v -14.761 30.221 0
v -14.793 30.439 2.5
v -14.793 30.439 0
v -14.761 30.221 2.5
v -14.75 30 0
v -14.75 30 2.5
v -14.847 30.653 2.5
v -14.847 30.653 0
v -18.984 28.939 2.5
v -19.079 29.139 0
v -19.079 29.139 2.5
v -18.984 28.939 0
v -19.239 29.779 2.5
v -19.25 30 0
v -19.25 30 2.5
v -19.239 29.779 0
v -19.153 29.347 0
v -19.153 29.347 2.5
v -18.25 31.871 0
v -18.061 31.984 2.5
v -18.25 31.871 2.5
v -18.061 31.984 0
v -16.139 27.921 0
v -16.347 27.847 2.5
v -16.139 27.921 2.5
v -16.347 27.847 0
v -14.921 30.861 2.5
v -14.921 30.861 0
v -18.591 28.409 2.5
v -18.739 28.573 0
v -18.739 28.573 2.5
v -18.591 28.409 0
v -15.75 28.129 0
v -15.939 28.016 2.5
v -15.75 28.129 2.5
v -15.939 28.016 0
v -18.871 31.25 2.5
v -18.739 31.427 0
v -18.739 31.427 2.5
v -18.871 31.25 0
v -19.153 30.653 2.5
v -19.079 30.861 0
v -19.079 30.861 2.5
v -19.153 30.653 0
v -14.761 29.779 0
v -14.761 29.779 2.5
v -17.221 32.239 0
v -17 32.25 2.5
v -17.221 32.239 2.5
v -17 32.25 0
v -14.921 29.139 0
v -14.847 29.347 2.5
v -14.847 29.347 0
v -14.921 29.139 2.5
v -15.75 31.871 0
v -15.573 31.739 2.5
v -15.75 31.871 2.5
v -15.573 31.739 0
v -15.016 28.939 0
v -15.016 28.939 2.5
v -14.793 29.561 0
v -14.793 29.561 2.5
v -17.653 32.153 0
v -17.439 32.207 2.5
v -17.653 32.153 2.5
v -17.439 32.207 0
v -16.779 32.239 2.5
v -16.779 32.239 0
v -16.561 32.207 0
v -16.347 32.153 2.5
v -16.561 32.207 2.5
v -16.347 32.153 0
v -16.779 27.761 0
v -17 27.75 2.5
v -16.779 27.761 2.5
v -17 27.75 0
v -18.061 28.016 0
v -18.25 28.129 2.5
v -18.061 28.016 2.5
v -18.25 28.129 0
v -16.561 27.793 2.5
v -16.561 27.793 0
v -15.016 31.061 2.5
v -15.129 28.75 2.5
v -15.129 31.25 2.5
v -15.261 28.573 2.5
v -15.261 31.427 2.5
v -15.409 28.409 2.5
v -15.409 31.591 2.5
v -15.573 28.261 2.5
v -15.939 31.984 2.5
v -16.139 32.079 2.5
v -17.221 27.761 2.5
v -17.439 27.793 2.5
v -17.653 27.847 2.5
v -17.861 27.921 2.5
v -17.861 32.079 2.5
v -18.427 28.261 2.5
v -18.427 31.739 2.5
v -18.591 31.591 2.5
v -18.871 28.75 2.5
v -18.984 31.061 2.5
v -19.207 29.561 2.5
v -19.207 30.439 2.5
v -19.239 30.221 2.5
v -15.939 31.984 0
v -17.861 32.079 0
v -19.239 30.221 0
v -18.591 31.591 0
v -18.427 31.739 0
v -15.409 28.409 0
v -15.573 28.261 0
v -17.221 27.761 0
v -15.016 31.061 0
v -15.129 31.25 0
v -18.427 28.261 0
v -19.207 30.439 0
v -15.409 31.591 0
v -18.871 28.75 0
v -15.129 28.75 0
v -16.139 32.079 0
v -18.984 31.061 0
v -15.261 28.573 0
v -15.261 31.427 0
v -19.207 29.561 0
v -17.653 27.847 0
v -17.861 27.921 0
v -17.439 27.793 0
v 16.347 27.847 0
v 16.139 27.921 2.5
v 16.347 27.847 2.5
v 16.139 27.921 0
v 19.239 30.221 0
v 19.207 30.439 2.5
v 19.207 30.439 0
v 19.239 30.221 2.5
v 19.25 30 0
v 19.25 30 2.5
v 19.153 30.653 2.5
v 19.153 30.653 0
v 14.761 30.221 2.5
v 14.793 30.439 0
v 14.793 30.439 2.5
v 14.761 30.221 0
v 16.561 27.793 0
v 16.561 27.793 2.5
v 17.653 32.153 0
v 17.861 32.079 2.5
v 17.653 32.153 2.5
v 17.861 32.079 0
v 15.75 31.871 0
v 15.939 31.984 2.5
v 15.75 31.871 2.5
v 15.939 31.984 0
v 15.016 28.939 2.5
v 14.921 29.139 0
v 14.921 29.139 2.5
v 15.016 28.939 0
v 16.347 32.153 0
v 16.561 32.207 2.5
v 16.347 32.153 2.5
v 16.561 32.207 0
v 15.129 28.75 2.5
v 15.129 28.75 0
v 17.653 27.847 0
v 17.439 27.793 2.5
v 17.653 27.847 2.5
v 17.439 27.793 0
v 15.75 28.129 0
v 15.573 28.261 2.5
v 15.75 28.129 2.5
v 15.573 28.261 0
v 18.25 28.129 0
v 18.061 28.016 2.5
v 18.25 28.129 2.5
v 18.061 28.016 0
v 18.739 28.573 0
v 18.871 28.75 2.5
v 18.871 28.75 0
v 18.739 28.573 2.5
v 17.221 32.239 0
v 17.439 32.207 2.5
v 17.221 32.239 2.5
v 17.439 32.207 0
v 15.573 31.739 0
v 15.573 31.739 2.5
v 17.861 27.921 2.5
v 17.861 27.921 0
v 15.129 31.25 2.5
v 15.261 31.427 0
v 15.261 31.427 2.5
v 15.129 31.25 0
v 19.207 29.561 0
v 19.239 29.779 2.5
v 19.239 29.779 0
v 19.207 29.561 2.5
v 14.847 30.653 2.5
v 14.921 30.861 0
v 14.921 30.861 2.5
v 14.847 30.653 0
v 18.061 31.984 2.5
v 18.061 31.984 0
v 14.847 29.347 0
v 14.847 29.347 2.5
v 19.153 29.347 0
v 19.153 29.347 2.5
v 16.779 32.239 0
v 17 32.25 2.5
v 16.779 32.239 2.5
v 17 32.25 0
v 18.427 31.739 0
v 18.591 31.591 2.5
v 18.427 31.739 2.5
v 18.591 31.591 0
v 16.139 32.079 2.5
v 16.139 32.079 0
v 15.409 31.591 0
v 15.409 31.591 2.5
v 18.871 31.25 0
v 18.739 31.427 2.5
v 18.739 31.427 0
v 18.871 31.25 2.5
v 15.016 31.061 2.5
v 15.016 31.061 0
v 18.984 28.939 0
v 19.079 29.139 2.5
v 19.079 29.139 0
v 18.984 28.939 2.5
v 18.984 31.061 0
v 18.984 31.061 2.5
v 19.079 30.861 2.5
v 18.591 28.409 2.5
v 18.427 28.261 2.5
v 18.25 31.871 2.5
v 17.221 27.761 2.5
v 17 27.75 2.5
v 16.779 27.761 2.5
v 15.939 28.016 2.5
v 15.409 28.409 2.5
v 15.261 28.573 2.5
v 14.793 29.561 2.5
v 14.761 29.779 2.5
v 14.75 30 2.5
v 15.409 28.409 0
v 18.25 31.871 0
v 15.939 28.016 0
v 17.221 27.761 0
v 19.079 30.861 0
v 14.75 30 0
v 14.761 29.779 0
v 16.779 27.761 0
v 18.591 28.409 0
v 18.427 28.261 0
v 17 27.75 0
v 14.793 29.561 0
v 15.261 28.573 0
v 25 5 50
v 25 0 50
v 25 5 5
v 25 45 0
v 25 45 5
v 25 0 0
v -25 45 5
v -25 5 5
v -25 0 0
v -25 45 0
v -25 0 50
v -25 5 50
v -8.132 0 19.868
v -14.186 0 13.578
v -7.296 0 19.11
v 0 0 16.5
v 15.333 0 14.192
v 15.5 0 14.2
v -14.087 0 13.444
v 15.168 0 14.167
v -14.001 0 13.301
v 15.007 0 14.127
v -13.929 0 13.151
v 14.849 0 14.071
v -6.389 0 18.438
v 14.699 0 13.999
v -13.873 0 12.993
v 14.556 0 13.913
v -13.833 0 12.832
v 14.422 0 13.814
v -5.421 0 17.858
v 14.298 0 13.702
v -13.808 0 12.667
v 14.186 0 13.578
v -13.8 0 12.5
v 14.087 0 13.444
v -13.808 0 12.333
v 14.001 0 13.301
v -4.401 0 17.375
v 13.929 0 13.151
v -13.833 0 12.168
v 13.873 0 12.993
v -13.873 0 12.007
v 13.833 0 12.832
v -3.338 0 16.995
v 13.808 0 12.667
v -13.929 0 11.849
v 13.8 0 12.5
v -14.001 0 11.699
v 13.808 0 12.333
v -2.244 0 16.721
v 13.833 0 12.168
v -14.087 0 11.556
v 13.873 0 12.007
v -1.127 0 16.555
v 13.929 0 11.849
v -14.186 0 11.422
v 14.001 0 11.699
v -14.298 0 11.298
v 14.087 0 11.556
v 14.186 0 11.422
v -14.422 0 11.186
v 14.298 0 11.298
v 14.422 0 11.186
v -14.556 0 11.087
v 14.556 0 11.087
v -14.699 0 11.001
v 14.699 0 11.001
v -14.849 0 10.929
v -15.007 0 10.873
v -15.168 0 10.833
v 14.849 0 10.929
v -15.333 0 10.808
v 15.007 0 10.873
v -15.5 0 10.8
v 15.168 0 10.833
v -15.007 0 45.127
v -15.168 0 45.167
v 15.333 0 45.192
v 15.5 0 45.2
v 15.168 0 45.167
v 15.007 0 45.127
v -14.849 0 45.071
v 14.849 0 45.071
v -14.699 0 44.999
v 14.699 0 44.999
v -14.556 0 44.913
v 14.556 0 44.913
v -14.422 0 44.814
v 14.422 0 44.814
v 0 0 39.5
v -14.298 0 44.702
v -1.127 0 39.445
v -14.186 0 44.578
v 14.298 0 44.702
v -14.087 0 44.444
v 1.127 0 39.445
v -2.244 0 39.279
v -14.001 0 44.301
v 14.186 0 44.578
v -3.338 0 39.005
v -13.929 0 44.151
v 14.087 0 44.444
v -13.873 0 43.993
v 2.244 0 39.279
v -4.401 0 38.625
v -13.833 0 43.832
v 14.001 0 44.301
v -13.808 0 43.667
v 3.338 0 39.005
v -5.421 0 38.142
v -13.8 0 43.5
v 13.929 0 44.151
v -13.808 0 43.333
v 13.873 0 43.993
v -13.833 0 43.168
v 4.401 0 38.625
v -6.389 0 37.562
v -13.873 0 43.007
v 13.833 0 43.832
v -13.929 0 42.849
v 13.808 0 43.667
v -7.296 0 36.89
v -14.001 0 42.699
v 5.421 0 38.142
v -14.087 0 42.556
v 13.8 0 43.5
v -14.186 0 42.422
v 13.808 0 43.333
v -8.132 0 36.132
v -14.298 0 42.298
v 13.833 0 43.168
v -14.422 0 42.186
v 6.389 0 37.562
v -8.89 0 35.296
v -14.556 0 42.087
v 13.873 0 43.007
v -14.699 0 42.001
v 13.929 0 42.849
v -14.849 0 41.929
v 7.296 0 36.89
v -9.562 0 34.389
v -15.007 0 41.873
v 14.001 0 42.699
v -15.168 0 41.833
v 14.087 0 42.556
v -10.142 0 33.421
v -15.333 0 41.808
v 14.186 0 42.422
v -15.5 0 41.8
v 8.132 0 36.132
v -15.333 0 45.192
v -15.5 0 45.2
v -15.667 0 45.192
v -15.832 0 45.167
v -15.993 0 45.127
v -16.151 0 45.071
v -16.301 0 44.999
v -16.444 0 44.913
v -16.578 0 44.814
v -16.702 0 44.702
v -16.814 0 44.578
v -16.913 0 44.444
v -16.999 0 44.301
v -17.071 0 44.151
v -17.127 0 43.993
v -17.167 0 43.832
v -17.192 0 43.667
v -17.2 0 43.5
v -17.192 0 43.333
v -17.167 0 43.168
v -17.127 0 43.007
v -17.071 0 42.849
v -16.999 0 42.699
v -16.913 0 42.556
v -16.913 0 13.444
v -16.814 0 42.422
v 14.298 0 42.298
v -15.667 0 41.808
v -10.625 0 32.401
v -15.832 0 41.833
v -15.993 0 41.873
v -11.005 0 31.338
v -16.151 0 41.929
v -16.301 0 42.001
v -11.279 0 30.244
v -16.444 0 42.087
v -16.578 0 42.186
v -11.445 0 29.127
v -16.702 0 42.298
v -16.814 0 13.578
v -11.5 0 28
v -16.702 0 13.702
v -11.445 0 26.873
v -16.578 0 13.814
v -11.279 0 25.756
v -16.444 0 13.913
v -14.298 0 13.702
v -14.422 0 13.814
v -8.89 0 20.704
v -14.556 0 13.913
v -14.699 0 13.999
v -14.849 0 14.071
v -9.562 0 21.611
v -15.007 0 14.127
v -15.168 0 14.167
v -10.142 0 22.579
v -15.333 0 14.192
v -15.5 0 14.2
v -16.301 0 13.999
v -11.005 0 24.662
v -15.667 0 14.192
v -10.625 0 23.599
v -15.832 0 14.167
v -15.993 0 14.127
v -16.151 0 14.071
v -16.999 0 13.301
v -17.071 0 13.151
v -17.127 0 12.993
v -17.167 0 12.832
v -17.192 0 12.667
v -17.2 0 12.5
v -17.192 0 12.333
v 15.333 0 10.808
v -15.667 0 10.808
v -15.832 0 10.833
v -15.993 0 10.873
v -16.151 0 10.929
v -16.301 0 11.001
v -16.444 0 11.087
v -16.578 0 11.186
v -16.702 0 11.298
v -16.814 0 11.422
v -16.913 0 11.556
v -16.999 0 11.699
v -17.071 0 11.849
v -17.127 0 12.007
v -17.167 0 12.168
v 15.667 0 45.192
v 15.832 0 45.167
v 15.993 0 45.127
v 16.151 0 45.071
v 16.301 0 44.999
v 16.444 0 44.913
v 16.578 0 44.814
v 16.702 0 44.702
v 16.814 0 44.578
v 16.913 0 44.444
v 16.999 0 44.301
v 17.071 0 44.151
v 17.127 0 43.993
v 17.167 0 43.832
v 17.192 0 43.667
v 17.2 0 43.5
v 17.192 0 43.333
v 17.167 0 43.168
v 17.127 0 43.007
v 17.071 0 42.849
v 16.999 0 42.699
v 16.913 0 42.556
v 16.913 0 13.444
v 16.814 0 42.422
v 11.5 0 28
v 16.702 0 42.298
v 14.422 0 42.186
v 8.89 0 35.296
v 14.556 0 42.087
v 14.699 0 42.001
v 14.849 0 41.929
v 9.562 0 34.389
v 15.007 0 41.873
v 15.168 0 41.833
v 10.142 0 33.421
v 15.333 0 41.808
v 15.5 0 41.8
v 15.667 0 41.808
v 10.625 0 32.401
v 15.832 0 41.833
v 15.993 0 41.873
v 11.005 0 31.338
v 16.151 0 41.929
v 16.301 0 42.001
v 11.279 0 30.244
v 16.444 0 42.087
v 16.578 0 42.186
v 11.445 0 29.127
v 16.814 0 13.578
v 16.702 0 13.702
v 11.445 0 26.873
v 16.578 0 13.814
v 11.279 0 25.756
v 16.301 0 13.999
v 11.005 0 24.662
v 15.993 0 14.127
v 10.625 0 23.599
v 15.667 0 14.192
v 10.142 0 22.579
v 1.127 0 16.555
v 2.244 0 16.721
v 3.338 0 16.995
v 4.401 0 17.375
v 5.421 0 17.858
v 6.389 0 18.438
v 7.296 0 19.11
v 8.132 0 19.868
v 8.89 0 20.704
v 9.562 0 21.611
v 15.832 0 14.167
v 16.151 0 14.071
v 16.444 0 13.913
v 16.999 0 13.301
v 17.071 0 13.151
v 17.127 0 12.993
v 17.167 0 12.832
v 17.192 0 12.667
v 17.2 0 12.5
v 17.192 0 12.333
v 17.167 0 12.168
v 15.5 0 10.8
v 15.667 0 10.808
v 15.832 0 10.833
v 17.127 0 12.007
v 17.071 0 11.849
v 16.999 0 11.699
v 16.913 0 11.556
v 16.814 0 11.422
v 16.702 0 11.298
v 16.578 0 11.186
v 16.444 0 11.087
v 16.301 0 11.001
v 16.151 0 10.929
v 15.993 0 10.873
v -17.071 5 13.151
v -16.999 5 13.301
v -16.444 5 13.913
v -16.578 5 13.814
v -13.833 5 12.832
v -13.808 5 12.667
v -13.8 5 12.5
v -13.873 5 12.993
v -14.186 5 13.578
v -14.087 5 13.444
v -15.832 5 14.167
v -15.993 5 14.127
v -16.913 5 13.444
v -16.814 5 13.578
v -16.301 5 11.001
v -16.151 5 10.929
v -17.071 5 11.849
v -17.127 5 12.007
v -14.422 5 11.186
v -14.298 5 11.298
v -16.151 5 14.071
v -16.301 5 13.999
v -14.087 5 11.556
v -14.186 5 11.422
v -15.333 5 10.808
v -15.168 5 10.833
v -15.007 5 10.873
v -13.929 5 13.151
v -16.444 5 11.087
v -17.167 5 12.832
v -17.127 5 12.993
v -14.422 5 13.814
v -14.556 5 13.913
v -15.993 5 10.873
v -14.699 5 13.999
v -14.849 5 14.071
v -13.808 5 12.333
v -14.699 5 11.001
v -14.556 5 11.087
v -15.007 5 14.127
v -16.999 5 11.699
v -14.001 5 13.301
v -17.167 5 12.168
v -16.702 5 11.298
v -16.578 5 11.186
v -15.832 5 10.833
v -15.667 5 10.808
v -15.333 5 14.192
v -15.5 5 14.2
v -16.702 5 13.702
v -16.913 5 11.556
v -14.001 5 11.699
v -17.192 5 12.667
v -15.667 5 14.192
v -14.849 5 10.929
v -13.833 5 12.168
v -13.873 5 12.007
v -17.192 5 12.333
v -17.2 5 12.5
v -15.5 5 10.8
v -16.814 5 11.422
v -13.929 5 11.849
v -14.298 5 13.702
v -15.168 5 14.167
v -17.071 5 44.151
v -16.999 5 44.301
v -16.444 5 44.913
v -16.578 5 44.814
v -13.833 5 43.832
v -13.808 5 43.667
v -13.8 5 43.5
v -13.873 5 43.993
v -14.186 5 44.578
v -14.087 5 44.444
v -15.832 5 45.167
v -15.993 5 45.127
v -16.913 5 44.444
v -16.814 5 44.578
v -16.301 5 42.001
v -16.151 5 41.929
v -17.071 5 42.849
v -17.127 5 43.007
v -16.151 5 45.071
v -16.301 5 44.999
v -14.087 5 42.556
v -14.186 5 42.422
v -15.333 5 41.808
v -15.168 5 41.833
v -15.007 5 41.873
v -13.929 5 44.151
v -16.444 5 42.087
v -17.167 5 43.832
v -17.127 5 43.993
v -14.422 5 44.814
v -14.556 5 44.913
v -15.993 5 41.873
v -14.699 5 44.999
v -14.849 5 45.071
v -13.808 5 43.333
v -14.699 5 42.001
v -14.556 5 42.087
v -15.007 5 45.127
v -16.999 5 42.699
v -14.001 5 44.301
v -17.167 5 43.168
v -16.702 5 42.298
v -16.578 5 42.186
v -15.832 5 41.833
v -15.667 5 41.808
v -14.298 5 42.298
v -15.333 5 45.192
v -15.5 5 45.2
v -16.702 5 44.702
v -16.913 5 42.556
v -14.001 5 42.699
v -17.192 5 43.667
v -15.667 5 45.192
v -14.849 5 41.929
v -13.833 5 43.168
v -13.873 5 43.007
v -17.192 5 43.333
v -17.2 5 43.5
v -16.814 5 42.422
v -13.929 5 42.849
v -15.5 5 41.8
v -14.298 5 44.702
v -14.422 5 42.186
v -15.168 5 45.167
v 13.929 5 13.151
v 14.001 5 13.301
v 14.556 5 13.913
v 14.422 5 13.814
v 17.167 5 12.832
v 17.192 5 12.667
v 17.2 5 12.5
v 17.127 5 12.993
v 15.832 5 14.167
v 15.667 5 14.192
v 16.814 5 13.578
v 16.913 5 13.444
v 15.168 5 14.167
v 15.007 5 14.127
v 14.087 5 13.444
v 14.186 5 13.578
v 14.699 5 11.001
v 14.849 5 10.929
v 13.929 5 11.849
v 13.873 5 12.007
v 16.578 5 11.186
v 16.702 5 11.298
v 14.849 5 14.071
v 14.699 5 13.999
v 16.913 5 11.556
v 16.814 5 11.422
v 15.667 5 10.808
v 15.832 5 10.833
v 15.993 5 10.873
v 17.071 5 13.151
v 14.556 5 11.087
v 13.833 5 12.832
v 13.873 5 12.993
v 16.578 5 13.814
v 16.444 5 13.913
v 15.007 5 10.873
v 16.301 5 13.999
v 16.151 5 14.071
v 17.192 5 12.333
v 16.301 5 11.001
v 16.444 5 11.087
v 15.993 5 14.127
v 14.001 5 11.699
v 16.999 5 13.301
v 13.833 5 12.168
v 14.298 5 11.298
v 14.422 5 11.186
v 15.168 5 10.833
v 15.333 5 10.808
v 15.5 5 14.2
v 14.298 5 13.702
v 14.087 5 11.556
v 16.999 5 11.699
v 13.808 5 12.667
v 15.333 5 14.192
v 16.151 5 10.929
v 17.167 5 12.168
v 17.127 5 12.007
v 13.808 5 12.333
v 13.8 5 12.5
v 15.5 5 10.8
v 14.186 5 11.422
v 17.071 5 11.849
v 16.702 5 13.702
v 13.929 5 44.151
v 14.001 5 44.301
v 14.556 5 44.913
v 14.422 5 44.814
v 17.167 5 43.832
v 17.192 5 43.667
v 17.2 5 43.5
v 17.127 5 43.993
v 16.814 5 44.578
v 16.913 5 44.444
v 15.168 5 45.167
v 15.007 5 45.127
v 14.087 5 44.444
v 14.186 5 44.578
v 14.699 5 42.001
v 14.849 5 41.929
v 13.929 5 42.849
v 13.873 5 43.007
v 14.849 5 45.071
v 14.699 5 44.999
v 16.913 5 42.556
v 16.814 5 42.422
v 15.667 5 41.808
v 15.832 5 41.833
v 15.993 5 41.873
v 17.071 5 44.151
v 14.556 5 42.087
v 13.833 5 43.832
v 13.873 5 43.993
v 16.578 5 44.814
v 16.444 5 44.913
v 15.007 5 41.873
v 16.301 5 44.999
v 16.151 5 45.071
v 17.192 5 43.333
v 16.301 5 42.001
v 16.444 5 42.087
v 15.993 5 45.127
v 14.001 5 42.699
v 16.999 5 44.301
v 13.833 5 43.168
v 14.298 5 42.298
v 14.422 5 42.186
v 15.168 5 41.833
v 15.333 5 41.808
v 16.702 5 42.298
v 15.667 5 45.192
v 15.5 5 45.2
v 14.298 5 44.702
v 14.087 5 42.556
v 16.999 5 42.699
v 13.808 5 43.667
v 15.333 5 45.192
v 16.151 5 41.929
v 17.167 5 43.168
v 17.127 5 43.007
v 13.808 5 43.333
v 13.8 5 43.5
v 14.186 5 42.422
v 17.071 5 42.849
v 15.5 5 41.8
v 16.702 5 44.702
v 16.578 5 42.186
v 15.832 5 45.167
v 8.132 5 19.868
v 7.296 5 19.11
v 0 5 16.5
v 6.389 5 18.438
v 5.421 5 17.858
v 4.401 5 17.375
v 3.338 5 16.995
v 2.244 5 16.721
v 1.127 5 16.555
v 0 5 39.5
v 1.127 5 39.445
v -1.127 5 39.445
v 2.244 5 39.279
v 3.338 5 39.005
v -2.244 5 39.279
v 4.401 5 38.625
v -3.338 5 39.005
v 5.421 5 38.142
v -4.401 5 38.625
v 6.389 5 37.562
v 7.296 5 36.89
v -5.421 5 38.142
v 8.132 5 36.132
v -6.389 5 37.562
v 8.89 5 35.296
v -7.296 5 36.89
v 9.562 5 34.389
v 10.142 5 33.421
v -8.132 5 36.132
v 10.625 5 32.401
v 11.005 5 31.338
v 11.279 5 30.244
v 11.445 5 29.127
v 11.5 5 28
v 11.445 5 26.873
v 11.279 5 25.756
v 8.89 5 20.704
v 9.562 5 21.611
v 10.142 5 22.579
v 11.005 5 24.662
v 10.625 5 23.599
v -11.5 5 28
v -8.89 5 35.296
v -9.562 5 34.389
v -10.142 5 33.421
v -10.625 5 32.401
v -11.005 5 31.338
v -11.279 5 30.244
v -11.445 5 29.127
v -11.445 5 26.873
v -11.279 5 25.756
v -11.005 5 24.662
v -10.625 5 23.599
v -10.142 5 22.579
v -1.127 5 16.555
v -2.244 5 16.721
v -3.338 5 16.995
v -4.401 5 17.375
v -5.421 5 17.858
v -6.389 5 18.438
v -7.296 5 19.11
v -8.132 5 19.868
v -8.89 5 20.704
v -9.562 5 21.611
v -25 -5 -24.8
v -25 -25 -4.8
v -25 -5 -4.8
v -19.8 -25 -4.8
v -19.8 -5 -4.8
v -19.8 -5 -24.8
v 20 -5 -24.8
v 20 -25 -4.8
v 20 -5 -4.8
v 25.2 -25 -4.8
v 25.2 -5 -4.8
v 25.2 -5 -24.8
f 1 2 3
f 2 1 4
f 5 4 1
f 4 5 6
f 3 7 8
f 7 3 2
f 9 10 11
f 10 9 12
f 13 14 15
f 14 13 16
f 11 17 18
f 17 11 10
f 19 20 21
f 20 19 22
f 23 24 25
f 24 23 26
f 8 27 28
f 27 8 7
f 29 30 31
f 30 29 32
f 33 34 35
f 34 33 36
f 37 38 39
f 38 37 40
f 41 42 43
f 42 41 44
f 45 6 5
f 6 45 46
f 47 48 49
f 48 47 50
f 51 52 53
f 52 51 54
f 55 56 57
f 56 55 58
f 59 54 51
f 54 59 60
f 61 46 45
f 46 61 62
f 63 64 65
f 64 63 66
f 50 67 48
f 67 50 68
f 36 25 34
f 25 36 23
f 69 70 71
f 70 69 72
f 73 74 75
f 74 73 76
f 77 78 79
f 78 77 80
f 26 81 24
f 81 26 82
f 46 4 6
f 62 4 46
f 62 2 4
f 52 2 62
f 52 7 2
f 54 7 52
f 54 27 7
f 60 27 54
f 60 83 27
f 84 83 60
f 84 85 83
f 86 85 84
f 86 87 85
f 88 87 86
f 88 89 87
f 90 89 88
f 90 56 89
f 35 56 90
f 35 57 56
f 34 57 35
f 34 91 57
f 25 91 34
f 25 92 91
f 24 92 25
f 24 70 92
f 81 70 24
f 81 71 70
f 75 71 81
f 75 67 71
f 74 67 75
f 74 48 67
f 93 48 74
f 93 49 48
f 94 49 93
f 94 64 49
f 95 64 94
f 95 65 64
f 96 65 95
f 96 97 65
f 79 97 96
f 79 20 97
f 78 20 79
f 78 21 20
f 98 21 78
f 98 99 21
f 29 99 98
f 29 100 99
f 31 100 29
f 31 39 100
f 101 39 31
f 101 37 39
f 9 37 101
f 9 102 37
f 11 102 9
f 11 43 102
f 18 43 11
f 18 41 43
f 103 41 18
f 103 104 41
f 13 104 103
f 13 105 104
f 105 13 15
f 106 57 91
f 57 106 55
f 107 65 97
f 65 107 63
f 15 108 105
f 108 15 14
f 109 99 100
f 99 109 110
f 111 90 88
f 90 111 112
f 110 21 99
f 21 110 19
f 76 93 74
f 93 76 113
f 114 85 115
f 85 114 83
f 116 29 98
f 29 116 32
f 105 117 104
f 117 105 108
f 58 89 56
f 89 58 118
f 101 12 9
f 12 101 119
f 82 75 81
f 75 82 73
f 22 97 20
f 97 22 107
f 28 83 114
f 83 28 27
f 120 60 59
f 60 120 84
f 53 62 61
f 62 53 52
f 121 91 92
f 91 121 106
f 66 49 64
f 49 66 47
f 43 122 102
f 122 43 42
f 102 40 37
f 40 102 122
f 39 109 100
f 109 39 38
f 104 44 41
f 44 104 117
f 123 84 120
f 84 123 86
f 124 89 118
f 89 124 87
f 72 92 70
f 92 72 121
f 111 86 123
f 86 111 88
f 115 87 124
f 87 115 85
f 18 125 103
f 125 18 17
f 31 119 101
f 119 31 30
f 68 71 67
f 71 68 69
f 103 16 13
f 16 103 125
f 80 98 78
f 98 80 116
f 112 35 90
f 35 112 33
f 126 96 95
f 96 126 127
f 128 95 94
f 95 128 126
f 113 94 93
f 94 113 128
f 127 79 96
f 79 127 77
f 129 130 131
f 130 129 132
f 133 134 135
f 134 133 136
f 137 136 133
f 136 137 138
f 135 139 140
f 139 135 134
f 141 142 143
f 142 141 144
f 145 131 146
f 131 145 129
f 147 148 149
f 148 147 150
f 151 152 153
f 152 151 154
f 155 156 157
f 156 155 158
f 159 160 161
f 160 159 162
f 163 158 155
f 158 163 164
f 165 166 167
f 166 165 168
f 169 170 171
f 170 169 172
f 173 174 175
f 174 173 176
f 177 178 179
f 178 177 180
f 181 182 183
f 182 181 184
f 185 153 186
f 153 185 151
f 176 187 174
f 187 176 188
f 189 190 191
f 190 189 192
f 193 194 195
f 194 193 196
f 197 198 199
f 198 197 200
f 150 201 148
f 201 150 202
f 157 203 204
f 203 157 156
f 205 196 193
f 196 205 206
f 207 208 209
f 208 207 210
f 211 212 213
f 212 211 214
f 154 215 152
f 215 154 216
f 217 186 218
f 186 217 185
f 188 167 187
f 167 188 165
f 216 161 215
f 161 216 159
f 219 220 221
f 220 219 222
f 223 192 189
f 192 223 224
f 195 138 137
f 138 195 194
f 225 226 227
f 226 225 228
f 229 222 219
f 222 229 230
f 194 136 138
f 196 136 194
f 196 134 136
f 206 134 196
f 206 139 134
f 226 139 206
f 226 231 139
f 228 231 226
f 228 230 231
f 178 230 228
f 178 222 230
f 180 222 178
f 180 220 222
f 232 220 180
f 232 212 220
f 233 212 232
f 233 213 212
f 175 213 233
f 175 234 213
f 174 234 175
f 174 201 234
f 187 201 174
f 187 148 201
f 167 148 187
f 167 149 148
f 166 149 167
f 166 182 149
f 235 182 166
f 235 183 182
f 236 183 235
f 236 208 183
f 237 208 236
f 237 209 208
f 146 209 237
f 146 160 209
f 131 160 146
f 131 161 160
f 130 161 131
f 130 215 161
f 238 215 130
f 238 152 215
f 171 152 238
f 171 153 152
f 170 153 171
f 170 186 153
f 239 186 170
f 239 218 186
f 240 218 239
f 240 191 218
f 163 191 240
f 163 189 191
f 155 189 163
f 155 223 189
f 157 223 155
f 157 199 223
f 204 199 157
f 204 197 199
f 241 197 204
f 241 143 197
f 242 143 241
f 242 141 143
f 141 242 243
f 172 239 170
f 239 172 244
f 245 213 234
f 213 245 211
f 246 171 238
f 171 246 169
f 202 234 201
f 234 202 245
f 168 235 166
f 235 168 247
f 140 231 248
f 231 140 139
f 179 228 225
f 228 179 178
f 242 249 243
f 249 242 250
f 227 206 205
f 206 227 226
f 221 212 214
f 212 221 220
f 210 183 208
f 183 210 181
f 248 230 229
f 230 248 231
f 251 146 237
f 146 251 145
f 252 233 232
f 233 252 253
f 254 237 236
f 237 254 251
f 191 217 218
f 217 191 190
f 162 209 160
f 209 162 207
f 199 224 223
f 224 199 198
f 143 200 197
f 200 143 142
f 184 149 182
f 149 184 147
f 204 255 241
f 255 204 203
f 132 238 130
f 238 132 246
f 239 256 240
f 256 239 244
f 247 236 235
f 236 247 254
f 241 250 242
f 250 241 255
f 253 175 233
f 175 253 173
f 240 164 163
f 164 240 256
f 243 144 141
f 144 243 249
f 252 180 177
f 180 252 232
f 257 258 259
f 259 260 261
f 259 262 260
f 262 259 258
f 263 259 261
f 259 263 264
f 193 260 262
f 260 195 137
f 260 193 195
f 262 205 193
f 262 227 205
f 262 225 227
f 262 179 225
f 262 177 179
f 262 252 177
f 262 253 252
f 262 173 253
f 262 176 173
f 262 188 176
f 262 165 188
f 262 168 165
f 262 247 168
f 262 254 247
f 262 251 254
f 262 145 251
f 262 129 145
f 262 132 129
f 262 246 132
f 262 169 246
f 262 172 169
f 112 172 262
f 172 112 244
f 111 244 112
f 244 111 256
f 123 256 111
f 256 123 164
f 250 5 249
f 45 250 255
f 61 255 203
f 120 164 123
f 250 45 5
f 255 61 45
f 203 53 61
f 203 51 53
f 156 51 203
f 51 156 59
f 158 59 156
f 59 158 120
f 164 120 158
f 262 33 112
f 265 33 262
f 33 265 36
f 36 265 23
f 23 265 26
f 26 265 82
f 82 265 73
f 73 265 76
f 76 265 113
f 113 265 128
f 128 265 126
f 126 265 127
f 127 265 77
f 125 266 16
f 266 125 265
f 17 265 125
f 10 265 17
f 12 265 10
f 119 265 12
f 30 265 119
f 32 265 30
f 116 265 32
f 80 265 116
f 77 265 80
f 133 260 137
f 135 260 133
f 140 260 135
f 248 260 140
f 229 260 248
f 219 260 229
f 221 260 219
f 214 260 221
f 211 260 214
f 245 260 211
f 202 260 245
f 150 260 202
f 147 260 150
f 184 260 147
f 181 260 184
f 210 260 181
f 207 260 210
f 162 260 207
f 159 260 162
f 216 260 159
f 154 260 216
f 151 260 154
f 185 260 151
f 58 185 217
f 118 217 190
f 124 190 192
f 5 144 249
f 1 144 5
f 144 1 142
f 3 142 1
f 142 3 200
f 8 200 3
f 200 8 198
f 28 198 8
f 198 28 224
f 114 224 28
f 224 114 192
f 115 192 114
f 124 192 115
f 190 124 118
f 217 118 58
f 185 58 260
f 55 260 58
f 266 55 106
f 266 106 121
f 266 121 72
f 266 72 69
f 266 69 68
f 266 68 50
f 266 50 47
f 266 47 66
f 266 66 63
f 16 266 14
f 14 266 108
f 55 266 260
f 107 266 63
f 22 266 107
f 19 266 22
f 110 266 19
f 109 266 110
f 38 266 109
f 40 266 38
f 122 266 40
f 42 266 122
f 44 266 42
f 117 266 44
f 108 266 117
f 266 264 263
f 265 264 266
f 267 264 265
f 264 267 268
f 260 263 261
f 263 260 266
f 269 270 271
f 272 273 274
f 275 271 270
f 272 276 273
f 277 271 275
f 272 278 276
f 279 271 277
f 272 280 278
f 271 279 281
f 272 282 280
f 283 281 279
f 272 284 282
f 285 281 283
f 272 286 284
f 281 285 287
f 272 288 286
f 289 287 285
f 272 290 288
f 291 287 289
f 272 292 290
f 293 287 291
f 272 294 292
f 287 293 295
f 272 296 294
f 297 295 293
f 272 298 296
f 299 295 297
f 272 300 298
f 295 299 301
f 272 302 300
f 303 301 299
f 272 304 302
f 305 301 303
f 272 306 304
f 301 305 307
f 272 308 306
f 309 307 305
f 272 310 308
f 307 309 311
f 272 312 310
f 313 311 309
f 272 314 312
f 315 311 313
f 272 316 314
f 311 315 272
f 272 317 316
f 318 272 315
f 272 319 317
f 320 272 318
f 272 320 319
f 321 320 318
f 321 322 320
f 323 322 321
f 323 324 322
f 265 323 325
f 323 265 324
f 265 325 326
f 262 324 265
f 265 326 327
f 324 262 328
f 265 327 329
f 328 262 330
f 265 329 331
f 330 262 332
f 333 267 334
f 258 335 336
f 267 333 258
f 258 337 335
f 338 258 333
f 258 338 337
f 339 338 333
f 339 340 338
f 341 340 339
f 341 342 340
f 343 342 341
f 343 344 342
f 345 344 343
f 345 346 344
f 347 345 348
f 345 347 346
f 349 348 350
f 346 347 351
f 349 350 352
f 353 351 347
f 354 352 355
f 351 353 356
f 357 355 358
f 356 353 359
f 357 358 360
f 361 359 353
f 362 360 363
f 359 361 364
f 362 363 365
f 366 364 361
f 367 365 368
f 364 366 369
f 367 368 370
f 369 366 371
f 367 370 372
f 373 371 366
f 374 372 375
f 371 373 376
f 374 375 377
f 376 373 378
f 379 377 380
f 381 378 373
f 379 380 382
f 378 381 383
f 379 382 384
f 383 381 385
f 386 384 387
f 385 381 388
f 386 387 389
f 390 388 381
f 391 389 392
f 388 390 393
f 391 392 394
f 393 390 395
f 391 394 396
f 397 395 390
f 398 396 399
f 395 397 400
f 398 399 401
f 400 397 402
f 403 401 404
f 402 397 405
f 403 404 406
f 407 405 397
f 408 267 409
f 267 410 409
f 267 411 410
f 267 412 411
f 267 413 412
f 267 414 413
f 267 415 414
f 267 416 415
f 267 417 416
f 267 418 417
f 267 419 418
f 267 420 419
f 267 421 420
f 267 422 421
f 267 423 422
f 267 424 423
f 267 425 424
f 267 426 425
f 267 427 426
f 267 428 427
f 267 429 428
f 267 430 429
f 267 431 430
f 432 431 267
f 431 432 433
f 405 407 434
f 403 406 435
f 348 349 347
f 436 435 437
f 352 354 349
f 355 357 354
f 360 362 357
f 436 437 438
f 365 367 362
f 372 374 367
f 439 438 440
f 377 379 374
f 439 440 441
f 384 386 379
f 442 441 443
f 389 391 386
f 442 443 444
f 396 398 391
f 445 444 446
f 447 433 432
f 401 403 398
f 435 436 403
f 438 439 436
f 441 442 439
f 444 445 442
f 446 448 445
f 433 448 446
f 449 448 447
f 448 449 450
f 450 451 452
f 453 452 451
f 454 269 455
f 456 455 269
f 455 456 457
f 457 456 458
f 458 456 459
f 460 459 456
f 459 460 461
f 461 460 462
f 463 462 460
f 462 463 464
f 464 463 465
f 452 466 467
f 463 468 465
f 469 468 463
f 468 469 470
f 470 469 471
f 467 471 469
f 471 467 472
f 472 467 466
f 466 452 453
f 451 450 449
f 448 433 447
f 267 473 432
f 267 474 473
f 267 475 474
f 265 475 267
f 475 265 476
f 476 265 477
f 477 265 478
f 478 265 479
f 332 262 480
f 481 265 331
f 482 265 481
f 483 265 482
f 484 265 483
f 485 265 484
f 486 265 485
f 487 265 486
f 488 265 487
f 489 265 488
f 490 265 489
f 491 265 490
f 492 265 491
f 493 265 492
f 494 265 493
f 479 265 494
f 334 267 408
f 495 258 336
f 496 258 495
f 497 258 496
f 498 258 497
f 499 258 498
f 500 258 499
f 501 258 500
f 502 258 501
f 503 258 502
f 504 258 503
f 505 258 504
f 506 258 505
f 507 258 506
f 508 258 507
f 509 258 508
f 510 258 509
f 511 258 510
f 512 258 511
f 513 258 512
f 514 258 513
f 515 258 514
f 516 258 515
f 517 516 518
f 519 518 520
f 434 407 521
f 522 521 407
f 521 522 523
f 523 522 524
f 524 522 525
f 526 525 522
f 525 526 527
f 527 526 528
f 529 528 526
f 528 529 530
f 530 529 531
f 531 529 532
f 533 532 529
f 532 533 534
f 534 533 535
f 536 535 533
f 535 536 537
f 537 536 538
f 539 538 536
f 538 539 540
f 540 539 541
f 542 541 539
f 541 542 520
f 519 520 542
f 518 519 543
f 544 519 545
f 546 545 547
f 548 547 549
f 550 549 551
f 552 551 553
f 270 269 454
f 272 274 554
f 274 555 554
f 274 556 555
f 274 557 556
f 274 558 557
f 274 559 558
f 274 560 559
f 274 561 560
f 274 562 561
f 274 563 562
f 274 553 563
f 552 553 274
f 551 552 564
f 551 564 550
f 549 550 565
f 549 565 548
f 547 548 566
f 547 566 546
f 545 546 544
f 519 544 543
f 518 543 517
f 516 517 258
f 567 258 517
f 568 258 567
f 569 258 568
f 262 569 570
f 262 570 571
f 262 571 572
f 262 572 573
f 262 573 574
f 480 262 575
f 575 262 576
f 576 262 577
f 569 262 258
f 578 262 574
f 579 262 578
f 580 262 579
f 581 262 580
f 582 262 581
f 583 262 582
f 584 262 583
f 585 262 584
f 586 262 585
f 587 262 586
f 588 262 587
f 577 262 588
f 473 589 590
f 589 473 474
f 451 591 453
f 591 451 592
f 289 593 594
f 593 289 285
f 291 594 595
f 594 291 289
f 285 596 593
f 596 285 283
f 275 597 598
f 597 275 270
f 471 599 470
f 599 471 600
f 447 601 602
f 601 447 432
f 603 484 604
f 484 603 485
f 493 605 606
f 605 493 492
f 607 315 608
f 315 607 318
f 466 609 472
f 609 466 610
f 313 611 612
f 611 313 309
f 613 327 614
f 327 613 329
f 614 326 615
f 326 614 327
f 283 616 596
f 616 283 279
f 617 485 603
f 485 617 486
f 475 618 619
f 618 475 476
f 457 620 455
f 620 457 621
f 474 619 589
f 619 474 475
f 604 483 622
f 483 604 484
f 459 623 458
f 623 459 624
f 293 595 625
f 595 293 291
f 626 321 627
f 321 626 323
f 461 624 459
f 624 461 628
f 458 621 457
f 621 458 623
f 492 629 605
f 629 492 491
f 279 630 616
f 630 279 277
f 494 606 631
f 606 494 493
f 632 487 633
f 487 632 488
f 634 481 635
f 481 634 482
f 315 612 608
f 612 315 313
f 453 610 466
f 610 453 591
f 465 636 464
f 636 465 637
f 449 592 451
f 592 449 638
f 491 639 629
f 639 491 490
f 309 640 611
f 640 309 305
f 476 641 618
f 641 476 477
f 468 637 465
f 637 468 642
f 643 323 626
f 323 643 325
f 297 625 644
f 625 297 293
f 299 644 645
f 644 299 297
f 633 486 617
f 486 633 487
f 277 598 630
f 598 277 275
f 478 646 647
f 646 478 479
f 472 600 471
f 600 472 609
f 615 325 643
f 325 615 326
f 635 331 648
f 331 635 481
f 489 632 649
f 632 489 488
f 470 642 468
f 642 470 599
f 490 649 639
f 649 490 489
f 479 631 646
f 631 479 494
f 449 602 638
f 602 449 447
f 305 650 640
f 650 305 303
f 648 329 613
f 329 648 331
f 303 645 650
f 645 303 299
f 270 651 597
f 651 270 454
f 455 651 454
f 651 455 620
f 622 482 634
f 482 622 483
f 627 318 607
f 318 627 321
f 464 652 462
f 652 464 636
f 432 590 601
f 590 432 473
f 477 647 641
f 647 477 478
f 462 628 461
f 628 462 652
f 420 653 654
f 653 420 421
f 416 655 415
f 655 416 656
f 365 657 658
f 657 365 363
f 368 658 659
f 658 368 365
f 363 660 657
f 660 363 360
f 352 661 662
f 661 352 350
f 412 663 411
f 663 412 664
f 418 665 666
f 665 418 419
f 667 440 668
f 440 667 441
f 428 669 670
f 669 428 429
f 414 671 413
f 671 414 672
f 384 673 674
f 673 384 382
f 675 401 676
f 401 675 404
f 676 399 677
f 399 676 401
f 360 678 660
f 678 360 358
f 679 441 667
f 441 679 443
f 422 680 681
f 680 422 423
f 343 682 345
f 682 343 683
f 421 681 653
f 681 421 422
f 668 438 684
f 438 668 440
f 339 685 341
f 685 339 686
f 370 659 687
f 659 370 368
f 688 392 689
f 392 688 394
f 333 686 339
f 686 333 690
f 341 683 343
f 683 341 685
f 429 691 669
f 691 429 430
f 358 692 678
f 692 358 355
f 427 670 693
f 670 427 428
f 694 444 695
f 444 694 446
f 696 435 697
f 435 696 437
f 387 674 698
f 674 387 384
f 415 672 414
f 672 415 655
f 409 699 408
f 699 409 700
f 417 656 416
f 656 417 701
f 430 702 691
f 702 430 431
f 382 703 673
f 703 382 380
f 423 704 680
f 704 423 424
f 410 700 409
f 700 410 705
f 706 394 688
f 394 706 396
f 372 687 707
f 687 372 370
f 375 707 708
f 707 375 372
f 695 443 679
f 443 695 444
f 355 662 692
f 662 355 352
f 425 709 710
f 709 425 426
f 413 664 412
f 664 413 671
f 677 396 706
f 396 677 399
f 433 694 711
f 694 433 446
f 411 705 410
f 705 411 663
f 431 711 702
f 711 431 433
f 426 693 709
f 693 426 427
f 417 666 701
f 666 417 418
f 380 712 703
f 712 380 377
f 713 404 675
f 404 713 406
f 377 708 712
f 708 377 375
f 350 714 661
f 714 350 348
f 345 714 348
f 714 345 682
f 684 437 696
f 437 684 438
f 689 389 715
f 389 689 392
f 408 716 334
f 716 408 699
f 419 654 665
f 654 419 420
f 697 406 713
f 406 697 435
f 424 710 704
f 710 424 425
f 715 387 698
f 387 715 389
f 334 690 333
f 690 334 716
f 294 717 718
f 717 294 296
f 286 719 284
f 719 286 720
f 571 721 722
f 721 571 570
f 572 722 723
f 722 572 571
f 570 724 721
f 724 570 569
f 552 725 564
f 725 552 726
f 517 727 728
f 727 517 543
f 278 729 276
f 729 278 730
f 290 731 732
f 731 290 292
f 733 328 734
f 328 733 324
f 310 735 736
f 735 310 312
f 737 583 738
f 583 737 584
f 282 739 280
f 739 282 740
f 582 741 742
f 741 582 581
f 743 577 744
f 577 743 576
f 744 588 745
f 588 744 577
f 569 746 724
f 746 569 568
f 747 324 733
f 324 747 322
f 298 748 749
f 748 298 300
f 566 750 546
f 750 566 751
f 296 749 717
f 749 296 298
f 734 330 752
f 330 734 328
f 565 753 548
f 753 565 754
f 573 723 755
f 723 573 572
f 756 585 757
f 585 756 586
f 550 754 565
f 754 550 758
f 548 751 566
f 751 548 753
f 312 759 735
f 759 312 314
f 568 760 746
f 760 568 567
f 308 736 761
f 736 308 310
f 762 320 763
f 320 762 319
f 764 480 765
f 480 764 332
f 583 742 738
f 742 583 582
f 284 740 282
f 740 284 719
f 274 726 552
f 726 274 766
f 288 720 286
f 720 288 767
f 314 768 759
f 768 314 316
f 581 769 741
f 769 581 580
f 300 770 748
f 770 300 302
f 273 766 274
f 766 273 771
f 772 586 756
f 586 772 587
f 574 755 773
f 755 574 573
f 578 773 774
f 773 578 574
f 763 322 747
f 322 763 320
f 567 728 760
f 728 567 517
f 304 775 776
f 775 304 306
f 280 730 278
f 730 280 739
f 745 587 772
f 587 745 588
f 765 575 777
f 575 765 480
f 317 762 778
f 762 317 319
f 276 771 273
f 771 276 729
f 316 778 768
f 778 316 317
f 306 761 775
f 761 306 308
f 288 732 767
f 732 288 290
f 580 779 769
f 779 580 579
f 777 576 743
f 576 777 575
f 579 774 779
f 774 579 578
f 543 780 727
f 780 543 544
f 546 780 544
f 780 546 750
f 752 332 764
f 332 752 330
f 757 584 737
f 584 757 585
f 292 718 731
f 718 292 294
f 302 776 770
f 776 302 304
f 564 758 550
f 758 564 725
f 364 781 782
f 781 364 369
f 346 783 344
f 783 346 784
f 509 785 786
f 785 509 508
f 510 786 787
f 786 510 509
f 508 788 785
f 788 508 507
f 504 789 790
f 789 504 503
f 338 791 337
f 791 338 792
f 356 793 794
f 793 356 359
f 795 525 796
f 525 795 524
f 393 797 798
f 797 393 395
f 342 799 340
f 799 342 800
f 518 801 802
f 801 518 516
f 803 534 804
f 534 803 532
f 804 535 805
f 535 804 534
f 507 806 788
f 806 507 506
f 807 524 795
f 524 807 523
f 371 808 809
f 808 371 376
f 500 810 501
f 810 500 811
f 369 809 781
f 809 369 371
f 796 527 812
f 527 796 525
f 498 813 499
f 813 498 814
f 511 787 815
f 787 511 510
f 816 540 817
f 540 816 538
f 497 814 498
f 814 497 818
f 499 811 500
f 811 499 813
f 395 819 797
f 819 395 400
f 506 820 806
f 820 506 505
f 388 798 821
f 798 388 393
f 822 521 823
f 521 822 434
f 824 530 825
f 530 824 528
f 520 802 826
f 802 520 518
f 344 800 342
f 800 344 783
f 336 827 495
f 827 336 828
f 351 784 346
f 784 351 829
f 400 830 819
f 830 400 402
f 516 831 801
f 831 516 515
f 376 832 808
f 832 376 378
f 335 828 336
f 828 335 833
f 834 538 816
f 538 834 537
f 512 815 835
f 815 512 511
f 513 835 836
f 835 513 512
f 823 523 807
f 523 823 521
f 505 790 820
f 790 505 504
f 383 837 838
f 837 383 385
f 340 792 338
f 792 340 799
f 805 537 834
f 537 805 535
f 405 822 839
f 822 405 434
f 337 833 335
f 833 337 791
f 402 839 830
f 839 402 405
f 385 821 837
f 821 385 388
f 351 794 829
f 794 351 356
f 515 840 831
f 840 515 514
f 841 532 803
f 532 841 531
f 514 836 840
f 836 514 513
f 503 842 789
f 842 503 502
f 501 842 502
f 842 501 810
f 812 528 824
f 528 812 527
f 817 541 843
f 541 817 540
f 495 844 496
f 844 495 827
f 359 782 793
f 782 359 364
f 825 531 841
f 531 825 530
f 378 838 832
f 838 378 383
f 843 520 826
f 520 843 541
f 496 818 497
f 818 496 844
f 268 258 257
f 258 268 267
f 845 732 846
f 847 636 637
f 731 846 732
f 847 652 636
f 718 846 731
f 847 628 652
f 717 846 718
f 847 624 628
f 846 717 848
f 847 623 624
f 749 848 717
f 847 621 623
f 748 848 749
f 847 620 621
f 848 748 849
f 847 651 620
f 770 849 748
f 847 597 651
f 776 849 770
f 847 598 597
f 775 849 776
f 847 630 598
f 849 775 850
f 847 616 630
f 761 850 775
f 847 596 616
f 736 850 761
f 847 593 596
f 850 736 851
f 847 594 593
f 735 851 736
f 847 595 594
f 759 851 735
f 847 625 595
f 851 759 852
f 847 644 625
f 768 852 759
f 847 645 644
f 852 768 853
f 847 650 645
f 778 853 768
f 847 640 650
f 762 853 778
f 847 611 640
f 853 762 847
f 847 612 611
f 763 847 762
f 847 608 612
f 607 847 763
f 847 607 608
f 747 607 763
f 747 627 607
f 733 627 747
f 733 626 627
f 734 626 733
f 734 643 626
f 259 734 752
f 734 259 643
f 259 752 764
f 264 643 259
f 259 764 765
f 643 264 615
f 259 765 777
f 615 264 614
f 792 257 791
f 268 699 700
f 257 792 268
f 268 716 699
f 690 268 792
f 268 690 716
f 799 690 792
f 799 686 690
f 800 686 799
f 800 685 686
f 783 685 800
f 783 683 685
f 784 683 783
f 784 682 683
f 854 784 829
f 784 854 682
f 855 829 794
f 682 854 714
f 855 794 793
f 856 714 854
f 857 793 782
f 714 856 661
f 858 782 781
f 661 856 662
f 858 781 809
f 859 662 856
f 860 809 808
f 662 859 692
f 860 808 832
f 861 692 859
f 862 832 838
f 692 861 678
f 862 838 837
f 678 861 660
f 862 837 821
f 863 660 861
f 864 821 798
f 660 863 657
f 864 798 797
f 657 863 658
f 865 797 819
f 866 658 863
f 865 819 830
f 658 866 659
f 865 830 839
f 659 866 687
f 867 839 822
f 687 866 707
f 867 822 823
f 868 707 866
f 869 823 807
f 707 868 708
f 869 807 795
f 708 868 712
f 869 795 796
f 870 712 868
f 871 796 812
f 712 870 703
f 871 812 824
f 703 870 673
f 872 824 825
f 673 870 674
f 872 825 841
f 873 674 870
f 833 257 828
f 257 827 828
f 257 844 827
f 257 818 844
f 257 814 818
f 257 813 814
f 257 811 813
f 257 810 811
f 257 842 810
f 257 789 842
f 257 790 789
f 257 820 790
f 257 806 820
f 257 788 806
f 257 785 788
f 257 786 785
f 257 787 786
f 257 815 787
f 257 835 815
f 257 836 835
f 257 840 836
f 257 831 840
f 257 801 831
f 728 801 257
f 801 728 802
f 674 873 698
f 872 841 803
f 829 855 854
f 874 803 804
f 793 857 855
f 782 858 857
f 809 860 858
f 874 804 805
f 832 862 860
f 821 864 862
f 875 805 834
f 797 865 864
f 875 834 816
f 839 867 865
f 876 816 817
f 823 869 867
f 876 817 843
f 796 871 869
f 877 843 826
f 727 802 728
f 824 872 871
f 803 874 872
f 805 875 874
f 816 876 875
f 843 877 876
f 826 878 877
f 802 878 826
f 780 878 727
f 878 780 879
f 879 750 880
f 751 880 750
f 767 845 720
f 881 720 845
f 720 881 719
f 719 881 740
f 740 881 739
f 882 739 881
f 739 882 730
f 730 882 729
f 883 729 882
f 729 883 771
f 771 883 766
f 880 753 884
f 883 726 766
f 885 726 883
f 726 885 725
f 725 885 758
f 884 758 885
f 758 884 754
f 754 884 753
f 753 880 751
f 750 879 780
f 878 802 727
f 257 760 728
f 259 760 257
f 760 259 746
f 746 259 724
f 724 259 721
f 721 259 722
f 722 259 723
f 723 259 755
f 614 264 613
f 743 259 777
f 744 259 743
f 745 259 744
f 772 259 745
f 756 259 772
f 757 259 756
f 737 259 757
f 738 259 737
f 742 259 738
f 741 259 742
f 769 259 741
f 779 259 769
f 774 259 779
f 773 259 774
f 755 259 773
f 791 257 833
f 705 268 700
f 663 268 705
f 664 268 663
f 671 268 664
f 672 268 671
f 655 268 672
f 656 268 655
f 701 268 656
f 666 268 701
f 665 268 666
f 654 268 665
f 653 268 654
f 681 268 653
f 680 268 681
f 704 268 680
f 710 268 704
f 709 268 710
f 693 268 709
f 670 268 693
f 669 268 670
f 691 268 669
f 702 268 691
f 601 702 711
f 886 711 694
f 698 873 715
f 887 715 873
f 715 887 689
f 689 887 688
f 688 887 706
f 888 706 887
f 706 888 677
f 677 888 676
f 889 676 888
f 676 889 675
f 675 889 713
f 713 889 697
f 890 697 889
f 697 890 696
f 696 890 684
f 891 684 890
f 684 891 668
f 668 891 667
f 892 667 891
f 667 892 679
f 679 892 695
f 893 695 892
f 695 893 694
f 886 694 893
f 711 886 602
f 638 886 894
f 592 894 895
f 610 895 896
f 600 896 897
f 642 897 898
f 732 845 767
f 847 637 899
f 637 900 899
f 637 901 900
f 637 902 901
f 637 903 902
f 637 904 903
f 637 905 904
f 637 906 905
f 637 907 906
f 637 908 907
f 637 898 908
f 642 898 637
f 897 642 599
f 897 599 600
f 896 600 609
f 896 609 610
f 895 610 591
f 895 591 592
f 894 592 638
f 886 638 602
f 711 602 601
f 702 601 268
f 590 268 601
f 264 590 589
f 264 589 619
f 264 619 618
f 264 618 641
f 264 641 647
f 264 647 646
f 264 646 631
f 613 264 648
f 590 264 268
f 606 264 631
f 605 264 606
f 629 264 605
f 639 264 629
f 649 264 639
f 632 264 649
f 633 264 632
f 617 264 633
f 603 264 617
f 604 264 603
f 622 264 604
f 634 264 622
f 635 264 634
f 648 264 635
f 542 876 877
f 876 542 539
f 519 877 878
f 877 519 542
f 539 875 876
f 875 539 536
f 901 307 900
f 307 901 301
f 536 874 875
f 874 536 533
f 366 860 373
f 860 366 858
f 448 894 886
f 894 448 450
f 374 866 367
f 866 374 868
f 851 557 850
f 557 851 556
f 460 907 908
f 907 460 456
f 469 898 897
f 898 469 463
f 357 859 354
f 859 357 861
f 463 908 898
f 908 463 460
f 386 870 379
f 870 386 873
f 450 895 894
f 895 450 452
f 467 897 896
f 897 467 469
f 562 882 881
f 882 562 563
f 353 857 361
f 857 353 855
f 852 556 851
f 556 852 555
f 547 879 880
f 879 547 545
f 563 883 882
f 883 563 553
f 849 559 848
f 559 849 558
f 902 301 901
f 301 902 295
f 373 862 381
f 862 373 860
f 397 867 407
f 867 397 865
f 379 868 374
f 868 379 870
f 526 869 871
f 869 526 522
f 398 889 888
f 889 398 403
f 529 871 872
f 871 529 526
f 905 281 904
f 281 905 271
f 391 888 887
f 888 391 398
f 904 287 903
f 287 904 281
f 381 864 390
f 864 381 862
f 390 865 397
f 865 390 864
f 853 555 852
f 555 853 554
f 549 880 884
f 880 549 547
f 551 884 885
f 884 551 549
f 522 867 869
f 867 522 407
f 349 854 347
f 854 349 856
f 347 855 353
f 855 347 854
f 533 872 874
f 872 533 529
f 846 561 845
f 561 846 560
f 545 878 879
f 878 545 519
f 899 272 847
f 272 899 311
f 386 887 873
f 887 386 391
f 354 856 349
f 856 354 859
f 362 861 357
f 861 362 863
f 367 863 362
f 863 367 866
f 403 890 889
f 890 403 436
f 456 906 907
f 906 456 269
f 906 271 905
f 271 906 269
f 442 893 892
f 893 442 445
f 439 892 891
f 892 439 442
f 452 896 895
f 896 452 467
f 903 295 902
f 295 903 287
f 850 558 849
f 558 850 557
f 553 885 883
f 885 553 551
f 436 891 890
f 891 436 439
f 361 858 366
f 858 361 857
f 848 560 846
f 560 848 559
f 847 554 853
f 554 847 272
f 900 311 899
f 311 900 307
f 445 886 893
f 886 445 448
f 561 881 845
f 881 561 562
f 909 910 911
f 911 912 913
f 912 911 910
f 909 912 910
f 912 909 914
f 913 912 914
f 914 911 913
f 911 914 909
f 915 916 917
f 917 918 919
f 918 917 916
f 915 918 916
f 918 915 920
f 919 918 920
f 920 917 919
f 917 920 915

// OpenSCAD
//--------------------
// Parameters
//--------------------
base_x = 50;               // total width of base plate (x: -25 to 25)
base_y = 45;               // length of base plate (y: 0 to 45)
base_z = 5;                // thickness of base plate (z: 0 to 5)

m4_dia = 4.5;             // M4 hole diameter
m4_radius = m4_dia/2;
m4_extend = 0.2;          // extra length beyond faces for clean cut

motor_y = 5;               // thickness of motor plate in Y direction
motor_z = 50;              // height of motor plate in Z direction

boss_dia = 23;             // motor centring boss hole diameter
boss_radius = boss_dia/2;
boss_extend = 0.2;         // extra length beyond faces for clean cut

m3_dia = 3.4;              // M3 screw hole diameter
m3_radius = m3_dia/2;
m3_extend = 0.2;           // extra length beyond faces for clean cut

gusset_thick = 5;          // thickness of gussets (in X)
gusset_leg = 20;           // leg length of right‑triangle in Y and Z
gusset_extend = 0.2;       // extra length beyond faces for clean cut
// pre‑computed offsets for the gusset polygon (Y‑Z plane)
gusset_y0 = 5 - gusset_extend;          // start Y (flush with base plate top)
gusset_y1 = gusset_y0 + gusset_leg;    // end Y
gusset_z0 = -5;                        // start Z (negative to allow rotation)
gusset_z1 = gusset_z0 - gusset_leg;    // end Z (negative)

//--------------------
// Geometry
//--------------------
$fn = 64;

// Base plate with M4 holes (vertical through Z)
module base_plate() {
    difference() {
        // solid block
        translate([-base_x/2, 0, 0])
            cube([base_x, base_y, base_z], center = false);
        // M4 holes
        for (pos = [[-17, 30], [17, 30]]) {
            translate([pos[0], pos[1], -m4_extend])
                cylinder(r = m4_radius,
                         h = base_z + 2*m4_extend,
                         center = true);
        }
    }
}

// Motor plate with boss hole and M3 screw holes (cut along Y)
module motor_plate() {
    difference() {
        // solid block
        translate([-base_x/2, 0, 0])
            cube([base_x, motor_y, motor_z], center = false);
        // Boss hole (cylinder along Y)
        translate([0, motor_y/2, 28])
            rotate([90,0,0])
                cylinder(r = boss_radius,
                         h = motor_y + 2*boss_extend,
                         center = true);
        // Four M3 holes (cylinder along Y)
        for (dx = [-15.5, 15.5])
            for (dz = [12.5, 43.5])
                translate([dx, motor_y/2, dz])
                    rotate([90,0,0])
                        cylinder(r = m3_radius,
                                 h = motor_y + 2*m3_extend,
                                 center = true);
    }
}

// Single triangular gusset (right‑triangle in YZ, extruded in X)
module triangular_gusset() {
    // Define the triangle in the YZ plane with Y positive after rotation
    // (original Z is negative so that after rotate([0,90,0]) Y becomes positive)
    rotate([0,90,0])                     // rotate so extrusion goes along +X
        linear_extrude(height = gusset_thick + gusset_extend)
            polygon(points = [
                [gusset_y0, gusset_z0],                 // right‑angle corner
                [gusset_y1, gusset_z0],                 // point along +Y
                [gusset_y0, gusset_z1]                  // point along +Z
            ]);
}

// Left gusset (flush with x = -25 edge)
module left_gusset() {
    translate([-25, 0, 0])   // shift to the left edge
        triangular_gusset();
}

// Right gusset (flush with x = 25 edge)
module right_gusset() {
    translate([20, 0, 0])    // shift to the right edge (x = 20..25)
        triangular_gusset();
}

//--------------------
// Assembly
//--------------------
union() {
    base_plate();
    motor_plate();
    left_gusset();
    right_gusset();
}
